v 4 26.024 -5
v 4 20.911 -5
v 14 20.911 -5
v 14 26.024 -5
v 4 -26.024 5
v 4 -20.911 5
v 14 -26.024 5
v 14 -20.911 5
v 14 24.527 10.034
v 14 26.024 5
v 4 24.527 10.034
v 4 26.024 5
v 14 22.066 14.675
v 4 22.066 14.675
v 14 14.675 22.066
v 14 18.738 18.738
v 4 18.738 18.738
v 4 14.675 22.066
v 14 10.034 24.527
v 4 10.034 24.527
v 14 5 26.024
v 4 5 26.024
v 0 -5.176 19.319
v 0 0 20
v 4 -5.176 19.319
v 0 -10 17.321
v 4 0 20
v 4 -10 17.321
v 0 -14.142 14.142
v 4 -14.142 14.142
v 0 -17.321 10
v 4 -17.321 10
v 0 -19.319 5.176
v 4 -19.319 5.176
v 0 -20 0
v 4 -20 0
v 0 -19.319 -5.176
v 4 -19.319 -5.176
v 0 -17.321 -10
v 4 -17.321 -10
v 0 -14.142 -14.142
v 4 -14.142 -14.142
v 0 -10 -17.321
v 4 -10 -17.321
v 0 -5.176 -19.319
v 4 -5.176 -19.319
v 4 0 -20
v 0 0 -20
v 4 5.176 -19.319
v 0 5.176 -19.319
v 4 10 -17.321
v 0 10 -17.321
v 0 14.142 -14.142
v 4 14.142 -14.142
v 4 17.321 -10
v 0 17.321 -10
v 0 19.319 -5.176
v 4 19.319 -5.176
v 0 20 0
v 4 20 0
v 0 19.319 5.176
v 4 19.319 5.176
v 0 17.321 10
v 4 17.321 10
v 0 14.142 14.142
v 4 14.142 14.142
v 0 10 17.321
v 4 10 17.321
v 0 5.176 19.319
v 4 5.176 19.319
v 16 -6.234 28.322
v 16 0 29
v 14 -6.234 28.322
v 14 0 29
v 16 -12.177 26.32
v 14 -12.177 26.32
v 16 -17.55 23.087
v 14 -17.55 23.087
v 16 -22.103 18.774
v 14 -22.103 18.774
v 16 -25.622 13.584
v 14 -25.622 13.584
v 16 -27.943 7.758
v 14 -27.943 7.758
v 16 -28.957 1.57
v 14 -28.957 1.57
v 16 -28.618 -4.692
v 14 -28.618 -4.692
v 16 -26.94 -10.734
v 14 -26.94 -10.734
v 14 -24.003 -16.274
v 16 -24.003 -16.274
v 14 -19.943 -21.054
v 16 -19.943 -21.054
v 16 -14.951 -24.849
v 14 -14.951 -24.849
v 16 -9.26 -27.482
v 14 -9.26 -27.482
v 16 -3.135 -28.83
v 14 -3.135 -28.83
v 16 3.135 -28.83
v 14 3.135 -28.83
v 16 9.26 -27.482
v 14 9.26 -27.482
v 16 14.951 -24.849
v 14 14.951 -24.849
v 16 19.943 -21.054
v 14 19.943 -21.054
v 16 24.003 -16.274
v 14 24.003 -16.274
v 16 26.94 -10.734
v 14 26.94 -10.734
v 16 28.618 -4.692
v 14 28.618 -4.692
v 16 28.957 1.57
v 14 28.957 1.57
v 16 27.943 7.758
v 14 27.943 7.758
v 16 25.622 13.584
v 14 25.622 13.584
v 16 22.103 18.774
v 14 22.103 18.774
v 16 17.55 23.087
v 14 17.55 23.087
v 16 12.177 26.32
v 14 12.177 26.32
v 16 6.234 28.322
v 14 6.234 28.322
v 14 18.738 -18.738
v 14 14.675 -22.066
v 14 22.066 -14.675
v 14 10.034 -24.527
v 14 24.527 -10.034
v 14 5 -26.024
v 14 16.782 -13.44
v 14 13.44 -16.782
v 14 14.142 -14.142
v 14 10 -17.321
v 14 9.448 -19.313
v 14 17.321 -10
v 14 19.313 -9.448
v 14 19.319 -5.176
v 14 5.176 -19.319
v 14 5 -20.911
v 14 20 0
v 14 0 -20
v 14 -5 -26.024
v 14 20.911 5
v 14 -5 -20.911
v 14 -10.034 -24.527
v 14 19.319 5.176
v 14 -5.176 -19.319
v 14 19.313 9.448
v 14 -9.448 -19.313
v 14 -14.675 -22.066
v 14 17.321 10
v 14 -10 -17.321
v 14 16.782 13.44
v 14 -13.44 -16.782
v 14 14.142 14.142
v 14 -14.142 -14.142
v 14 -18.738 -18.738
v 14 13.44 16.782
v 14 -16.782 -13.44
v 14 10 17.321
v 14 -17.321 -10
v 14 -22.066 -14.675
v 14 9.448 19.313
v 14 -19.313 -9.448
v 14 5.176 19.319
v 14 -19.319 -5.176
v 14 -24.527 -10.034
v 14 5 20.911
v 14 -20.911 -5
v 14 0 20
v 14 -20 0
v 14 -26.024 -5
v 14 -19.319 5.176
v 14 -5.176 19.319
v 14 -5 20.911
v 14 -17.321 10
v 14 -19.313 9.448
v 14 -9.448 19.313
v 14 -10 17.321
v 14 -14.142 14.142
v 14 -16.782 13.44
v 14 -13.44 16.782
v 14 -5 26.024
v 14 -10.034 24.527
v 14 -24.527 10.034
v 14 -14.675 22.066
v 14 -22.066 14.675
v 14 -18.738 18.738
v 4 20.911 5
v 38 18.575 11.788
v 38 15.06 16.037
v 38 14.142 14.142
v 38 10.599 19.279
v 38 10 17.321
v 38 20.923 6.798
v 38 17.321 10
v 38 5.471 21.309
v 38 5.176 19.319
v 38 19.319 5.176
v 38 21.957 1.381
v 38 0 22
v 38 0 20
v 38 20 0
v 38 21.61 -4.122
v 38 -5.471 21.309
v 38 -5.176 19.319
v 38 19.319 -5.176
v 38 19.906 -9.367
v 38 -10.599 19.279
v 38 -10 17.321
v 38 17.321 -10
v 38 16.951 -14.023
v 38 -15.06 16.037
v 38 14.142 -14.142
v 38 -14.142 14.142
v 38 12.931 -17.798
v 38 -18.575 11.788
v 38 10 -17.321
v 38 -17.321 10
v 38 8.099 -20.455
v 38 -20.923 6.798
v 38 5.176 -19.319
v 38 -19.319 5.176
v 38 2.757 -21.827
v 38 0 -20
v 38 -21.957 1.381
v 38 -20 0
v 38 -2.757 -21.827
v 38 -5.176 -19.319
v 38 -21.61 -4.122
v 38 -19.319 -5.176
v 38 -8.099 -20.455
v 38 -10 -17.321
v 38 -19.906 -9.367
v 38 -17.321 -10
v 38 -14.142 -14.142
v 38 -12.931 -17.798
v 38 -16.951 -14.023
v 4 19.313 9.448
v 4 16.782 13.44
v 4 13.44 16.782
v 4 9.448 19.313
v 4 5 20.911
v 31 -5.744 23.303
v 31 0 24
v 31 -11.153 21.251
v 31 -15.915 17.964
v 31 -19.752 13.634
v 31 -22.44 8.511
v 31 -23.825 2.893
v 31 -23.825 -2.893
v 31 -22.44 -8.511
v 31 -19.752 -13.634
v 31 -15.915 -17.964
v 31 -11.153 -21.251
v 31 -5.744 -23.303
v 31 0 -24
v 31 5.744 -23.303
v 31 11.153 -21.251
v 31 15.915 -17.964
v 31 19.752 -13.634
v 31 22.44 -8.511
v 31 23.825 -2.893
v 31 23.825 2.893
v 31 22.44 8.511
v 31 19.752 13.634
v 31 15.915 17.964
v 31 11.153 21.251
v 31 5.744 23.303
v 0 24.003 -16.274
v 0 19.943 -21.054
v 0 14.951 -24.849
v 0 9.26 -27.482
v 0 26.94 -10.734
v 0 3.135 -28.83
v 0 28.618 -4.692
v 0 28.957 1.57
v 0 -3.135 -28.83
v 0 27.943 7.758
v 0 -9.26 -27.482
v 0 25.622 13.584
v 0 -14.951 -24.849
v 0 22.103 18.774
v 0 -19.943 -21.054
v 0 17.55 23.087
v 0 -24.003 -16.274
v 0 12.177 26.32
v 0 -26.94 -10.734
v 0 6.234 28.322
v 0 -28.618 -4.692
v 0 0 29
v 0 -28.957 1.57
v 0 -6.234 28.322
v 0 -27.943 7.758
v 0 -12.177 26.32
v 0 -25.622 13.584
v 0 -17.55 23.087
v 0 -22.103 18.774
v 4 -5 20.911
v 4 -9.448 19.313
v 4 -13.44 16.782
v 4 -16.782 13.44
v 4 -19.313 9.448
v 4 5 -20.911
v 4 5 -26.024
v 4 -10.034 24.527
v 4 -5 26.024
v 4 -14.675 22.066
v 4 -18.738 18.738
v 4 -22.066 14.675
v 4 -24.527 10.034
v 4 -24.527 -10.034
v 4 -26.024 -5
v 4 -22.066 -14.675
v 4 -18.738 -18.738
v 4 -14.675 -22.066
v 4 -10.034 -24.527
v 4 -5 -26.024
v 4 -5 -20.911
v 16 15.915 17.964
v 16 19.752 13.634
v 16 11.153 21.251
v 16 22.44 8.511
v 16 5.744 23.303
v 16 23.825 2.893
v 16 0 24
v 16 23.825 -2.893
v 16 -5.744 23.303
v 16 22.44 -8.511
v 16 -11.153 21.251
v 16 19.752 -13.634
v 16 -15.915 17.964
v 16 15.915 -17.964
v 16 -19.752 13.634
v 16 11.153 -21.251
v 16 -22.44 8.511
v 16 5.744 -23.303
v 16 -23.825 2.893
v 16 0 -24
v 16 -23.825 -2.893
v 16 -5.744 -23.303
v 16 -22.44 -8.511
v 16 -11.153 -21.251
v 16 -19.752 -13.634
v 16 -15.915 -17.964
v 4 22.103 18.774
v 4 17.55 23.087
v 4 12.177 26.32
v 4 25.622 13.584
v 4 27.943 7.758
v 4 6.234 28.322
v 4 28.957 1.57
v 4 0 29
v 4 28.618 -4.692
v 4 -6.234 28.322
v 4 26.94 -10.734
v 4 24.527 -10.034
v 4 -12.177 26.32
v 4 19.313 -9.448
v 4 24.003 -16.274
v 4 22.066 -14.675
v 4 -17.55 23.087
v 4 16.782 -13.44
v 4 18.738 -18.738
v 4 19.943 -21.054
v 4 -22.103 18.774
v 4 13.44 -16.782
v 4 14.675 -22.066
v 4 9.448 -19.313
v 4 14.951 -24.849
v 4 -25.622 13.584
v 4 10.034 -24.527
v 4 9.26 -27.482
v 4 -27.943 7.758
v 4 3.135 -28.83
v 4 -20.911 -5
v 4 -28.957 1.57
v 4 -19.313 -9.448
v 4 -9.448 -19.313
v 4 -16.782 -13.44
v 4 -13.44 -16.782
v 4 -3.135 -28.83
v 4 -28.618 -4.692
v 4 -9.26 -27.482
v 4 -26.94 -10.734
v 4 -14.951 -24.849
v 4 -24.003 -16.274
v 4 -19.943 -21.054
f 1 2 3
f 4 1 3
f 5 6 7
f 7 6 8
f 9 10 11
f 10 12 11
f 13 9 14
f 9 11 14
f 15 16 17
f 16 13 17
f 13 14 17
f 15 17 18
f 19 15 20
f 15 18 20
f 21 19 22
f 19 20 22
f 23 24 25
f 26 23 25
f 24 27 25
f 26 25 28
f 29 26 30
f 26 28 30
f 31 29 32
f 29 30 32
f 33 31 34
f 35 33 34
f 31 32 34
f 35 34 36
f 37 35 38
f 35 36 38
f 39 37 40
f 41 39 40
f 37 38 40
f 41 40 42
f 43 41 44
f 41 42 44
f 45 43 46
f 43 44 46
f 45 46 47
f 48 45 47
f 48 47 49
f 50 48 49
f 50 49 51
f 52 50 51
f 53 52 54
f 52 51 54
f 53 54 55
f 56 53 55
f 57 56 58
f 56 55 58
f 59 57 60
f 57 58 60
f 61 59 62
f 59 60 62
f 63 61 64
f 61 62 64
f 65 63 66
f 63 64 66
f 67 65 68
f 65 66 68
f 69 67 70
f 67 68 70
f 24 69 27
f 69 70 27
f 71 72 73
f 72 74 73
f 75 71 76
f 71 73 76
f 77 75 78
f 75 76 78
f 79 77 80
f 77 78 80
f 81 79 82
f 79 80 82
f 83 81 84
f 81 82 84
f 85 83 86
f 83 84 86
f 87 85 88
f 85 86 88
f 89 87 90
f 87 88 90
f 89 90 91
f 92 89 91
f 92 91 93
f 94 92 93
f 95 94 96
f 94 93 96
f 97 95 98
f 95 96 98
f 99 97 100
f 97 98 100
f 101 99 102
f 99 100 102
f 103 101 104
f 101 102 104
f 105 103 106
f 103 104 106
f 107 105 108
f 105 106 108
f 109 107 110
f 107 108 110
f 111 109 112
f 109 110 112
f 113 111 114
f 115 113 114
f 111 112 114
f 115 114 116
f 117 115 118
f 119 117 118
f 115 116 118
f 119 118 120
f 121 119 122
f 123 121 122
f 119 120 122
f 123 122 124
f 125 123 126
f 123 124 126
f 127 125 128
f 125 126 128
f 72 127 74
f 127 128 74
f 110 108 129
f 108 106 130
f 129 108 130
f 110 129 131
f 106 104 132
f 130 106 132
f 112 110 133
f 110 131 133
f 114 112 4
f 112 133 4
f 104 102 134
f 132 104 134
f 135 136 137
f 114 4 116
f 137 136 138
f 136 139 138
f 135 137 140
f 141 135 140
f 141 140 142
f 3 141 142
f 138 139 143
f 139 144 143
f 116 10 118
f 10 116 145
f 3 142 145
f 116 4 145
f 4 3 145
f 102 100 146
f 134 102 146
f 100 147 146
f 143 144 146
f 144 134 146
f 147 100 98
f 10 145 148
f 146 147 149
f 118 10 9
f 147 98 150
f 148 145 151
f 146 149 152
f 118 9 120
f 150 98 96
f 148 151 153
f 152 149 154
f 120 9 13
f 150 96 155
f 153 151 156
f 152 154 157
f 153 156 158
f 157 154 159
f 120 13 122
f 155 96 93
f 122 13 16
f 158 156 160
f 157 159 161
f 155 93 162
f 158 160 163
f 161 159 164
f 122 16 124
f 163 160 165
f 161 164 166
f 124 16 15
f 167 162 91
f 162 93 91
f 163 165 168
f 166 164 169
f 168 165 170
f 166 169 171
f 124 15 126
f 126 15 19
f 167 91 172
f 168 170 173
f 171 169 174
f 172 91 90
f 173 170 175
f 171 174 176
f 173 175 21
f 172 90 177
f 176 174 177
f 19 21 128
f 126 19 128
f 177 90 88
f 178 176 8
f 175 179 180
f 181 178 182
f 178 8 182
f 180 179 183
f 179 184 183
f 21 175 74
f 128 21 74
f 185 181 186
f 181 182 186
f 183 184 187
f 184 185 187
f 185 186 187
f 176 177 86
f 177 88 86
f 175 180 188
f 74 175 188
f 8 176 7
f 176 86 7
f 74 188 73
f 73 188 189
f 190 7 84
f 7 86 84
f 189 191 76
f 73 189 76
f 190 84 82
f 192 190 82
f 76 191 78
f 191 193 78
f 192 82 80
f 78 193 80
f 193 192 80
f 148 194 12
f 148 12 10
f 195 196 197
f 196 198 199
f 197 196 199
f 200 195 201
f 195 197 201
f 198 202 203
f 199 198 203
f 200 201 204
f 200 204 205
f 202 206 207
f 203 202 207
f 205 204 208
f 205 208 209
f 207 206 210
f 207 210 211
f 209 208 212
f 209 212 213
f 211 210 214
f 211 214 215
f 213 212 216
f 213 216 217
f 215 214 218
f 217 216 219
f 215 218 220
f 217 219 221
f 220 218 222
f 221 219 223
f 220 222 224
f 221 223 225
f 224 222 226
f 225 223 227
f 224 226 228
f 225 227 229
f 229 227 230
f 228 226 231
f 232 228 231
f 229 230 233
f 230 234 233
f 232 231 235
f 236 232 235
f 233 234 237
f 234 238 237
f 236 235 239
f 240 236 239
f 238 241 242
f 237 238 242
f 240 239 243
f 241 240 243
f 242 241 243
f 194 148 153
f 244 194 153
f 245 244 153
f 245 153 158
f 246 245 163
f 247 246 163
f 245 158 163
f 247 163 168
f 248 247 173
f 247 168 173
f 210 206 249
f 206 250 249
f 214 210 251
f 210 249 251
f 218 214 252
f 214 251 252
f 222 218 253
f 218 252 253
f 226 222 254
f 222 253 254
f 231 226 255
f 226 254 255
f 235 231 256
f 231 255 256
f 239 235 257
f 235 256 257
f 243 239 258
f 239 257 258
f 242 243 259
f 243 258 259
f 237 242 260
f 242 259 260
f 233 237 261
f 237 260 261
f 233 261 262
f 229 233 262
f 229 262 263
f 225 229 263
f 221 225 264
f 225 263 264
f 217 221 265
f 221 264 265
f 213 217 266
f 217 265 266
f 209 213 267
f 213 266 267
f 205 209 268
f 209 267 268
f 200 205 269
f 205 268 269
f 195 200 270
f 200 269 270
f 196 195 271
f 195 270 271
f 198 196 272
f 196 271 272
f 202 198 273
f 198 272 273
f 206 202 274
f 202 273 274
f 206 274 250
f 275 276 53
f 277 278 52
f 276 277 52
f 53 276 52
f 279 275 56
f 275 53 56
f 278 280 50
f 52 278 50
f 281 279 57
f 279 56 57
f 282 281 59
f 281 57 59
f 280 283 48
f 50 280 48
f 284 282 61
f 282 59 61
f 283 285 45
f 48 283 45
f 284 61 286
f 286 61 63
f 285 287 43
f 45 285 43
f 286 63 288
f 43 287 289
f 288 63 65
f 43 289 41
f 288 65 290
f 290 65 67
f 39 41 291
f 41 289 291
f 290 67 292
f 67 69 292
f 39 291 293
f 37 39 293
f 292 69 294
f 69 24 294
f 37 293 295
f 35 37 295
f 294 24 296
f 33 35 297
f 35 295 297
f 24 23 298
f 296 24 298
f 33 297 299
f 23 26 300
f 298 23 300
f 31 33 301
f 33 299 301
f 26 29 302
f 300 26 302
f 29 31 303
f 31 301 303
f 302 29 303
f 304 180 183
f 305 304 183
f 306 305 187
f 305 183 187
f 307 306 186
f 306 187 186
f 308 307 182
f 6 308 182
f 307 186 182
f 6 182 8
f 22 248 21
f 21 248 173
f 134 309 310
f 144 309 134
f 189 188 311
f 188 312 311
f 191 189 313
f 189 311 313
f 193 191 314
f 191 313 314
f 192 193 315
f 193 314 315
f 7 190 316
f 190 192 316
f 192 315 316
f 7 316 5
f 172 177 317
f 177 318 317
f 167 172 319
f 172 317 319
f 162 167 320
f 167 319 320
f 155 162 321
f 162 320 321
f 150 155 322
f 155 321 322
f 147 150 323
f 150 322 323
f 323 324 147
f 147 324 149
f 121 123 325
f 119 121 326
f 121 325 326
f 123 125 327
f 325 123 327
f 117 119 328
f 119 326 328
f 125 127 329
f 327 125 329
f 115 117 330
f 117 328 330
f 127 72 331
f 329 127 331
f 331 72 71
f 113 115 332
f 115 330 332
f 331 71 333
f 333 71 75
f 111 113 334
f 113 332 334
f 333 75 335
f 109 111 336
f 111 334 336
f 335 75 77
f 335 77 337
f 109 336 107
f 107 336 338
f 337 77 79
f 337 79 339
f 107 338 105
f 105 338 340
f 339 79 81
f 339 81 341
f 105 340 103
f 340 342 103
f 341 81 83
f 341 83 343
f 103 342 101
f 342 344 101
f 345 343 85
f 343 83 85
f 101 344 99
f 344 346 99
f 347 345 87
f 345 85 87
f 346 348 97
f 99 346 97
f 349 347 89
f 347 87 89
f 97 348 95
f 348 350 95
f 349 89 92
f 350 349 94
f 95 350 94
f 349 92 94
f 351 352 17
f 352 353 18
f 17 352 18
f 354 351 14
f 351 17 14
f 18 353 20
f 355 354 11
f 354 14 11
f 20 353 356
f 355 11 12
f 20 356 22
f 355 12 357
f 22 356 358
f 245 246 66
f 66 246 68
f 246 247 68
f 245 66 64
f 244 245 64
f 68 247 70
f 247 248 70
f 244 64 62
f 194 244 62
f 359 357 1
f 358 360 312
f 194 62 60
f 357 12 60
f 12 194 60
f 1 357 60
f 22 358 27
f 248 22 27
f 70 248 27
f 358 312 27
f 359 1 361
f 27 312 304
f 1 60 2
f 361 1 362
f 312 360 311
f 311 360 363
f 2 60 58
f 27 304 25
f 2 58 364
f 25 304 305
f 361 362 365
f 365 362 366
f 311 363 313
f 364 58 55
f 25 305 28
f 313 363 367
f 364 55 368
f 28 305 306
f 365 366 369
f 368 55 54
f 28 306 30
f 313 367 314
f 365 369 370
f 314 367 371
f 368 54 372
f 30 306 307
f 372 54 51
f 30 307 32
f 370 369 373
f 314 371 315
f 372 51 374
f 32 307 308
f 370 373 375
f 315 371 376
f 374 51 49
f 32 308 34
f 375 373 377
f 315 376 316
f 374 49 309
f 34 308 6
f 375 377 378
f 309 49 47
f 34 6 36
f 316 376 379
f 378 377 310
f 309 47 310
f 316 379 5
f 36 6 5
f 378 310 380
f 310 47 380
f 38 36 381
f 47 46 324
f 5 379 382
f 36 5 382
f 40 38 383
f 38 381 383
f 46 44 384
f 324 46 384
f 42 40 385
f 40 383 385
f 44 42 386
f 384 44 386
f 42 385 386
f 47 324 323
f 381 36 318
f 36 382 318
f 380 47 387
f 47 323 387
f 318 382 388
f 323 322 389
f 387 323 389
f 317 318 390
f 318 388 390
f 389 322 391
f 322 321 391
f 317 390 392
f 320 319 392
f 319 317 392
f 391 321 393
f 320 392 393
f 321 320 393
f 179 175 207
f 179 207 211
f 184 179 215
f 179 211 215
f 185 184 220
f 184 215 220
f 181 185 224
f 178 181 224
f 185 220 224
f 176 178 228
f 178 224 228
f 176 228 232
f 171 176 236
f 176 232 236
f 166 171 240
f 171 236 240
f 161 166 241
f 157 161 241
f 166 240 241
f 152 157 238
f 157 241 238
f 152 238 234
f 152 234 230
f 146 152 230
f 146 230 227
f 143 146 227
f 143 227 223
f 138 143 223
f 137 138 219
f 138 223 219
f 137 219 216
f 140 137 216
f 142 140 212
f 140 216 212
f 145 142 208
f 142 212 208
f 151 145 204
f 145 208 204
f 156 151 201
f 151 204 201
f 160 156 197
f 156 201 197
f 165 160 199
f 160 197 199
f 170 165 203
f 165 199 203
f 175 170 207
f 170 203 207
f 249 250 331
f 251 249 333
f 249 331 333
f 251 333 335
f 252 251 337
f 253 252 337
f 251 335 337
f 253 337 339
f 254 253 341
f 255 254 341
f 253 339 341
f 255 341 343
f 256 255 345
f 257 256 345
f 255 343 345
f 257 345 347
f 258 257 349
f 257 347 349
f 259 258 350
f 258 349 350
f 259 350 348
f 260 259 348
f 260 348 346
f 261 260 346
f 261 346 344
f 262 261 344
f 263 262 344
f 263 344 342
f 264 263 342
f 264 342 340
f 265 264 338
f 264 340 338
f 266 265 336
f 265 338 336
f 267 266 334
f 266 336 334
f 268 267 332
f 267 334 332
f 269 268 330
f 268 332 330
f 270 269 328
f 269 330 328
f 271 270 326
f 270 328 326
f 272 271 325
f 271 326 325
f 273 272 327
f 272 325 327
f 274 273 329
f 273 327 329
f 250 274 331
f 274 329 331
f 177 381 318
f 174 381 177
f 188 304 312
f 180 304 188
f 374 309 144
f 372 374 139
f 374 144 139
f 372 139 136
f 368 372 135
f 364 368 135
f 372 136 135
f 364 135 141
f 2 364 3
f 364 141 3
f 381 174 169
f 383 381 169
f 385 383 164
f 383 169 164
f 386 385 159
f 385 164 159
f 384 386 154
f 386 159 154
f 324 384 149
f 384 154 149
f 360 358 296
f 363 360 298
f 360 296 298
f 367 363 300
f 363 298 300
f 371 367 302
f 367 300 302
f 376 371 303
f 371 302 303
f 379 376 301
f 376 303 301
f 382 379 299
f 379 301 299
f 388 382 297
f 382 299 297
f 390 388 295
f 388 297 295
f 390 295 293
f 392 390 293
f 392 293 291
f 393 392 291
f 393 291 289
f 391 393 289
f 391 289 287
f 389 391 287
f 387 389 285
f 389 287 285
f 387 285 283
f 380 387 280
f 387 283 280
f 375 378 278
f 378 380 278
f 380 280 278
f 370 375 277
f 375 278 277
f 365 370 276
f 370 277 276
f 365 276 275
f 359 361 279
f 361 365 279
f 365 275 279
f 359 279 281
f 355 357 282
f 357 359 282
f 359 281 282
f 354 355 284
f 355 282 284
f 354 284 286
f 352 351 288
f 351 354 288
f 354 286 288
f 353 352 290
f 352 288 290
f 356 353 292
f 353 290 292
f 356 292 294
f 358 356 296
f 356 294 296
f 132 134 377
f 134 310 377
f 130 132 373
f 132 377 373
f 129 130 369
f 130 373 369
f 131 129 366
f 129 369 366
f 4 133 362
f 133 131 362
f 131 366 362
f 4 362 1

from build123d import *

# Parameters (mm, degrees)
F2_W          = 10
F2_H          = 10
F3_DEPTH      = 100
F3_DEPTH_BACK = 100
F4_W          = 10
F4_H          = 10
F5_DEPTH      = 50
F5_DEPTH_BACK = 50


with BuildPart() as f1:
    # F0 (on Front) → F1 (revolve)
    with BuildSketch(Plane.XZ):
        Polygon((0, 29), (0, 20), (4, 20), (4, 21.5), (14, 21.5), (14, 20), (38, 20), (38, 22), (31, 24), (16, 24), (16, 29), (14, 29), (14, 26.5), (4, 26.5), (4, 29), align=None)
    revolve(axis=Axis((36.8667048862, 0, 0), (1, 0, 0)))

    # F2 (on Front) → F3 (cut, two sides)
    with BuildSketch(Plane.XZ) as f3_sk:
        with Locations((9, 0)):
            Rectangle(F2_W, F2_H)
    extrude(amount=-F3_DEPTH, mode=Mode.SUBTRACT)
    extrude(f3_sk.sketch, amount=F3_DEPTH_BACK, mode=Mode.SUBTRACT)

    # F4 (on Top) → F5 (cut, two sides)
    with BuildSketch(Plane.XY) as f5_sk:
        with Locations((9, 0)):
            Rectangle(F4_W, F4_H)
    extrude(amount=-F5_DEPTH, mode=Mode.SUBTRACT)
    extrude(f5_sk.sketch, amount=F5_DEPTH_BACK, mode=Mode.SUBTRACT)


solid = f1.part
